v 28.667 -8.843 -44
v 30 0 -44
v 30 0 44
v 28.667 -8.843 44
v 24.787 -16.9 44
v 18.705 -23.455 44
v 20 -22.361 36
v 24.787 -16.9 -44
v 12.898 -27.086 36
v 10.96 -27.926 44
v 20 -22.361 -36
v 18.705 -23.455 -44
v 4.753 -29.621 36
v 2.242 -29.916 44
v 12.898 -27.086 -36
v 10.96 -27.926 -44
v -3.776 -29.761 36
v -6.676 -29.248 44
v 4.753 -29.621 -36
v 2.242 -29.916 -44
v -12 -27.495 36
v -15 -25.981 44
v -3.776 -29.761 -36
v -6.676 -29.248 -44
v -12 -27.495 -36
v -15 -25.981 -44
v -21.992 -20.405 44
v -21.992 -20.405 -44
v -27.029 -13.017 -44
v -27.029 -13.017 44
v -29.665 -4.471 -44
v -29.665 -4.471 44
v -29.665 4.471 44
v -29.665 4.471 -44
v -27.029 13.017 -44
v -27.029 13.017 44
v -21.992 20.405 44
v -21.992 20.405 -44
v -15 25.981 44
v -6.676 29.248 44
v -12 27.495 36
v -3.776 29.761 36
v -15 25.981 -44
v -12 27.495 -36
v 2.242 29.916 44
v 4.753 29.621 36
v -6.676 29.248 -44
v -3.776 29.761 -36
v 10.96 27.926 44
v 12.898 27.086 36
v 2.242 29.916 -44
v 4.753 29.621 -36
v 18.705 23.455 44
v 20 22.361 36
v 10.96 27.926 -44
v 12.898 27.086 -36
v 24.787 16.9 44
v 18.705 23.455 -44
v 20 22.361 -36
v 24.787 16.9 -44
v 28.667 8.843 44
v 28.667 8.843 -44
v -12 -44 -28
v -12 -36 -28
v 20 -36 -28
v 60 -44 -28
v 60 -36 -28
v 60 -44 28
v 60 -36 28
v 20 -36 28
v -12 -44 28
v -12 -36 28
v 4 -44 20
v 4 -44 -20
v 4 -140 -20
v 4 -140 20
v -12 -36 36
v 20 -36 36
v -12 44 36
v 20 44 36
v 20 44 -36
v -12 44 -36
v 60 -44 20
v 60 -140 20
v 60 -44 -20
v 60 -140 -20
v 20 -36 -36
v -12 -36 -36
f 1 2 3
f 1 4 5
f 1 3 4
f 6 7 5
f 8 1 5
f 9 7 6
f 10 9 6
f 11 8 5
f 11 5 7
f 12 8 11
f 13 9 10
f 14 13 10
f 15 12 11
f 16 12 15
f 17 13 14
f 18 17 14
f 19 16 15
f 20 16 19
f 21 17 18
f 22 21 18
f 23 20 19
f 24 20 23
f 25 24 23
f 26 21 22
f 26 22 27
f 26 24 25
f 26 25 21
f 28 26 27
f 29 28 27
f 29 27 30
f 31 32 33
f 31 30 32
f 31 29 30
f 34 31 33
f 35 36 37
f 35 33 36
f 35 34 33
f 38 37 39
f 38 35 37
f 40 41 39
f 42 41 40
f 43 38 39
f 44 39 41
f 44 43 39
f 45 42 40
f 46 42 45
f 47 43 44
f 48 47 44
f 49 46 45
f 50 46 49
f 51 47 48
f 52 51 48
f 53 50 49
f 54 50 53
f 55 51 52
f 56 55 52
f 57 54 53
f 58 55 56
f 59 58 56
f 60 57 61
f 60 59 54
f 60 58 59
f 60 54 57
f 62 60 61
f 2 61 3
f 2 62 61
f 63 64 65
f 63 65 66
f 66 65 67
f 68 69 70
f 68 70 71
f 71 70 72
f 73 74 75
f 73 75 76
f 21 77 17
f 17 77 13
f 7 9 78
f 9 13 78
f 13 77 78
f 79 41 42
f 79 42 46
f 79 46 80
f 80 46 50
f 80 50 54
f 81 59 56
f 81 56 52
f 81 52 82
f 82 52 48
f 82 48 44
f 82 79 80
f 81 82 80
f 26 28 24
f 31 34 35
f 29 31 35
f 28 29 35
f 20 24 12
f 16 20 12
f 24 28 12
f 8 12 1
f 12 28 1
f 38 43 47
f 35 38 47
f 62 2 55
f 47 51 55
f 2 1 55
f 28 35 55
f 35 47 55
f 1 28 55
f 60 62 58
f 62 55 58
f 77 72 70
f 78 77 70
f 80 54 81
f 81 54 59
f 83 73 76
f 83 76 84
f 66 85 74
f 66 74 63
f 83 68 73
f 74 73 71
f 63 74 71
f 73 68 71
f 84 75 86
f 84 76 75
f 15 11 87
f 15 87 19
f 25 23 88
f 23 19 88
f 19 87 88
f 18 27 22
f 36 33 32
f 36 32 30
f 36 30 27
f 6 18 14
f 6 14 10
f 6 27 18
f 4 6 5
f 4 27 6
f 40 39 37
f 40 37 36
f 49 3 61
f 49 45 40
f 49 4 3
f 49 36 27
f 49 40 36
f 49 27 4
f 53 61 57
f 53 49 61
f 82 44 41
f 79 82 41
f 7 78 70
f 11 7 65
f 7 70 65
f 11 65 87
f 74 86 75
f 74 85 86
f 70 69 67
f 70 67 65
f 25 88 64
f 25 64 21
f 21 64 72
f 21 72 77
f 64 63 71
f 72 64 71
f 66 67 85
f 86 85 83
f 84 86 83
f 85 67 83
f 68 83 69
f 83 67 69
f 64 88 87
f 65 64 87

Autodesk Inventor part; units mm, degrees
ref_plane "YZ Plane" through (0, 0, 0) normal (1, 0, 0) x (0, 1, 0)
ref_plane "XY Plane" through (0, 0, 0) normal (0, 0, 1) x (1, 0, 0)
sketch "Sketch1" plane through (0, 0, 0) normal (0, 0, 1) x (1, 0, 0)
  circle A0 centre (0, 0) radius 30
  dimension "d0" = 60
extrude "Extrusion1" add sketch "Sketch1" along normal mid plane 88
sketch "Sketch2" plane through (0, 0, 0) normal (0, 1, 0) x (-1, 0, 0)
  line L0 (51.4648, 0) -> (-98.7887, 0) projected
  line L1 (0, -61.6) -> (0, 61.6) projected
  point P0 (0, 0)
  point P1 (-48, 0)
  dimension "d11" = 48
ref_plane "Work Plane1" through (0, -36, 0) normal (0, 1, 0) x (-1, 0, 0)
sketch "Sketch3" plane through (0, -36, 0) normal (0, 1, 0) x (-1, 0, 0)
  line L0 (12, -28) -> (-60, -28)
  line L1 (-60, -28) -> (-60, 28)
  line L2 (-60, 28) -> (12, 28)
  line L3 (12, 28) -> (12, -28)
  line L4 (12, -28) -> (-60, 28) construction
  line L5 (-60, -28) -> (12, 28) construction
  line L6 (47.0012, 0) -> (-72.0071, 0) projected
  point P0 (0, 0)
  point P1 (-24, 0)
  point P2 (-24, 0)
  point P3 (-48, 0)
  dimension "d13" = 12
  dimension "d14" = 56
  dimension "d15" = 60
extrude "Extrusion2" add sketch "Sketch3" against normal blind 8
sketch "Sketch4" plane through (0, -36, 0) normal (0, 1, 0) x (1, 0, 0)
  line L0 (-12, -36) -> (20, -36)
  line L1 (20, -36) -> (20, 36)
  line L2 (20, 36) -> (-12, 36)
  line L3 (-12, 36) -> (-12, -36)
  line L4 (-12, -36) -> (20, 36) construction
  line L5 (20, -36) -> (-12, 36) construction
  line L6 (-48, 0) -> (78, 0) projected
  line L7 (-12, -28) -> (-12, 28) projected
  line L8 (60, -28) -> (-12, -28) projected
  point P0 (0, 0)
  point P1 (4, 0)
  point P2 (4, 0)
  dimension "d18" = 32
  dimension "d19" = 8
extrude "Extrusion3" add sketch "Sketch4" along normal blind 80
sketch "Sketch5" plane through (0, -44, 0) normal (0, -1, 0) x (1, 0, 0)
  line L0 (60, -28) -> (60, 28) projected
  line L1 (4, 20) -> (60, 20)
  line L2 (60, 20) -> (60, -20)
  line L3 (60, -20) -> (4, -20)
  line L4 (4, -20) -> (4, 20)
  line L5 (4, 20) -> (60, -20) construction
  line L6 (60, 20) -> (4, -20) construction
  line L7 (-48, 0) -> (78, 0) projected
  point P0 (0, 0)
  point P1 (32, 0)
  point P2 (32, 0)
  dimension "d22" = 40
  dimension "d23" = 56
extrude "Extrusion4" add sketch "Sketch5" along normal blind 96
ref_plane "Work Plane2" through (0, 184, 0) normal (0, 1, 0) x (-1, 0, 0)
ref_plane "UCS3: YZ Plane" through (0, 0, 0) normal (1, 0, 0) x (0, 1, 0)
ref_plane "UCS3: XZ Plane" through (0, 0, 0) normal (0, 1, 0) x (0, 0, 1)
ref_plane "UCS3: XY Plane" through (0, 0, 0) normal (0, 0, 1) x (1, 0, 0)
properties part number "link_3"
